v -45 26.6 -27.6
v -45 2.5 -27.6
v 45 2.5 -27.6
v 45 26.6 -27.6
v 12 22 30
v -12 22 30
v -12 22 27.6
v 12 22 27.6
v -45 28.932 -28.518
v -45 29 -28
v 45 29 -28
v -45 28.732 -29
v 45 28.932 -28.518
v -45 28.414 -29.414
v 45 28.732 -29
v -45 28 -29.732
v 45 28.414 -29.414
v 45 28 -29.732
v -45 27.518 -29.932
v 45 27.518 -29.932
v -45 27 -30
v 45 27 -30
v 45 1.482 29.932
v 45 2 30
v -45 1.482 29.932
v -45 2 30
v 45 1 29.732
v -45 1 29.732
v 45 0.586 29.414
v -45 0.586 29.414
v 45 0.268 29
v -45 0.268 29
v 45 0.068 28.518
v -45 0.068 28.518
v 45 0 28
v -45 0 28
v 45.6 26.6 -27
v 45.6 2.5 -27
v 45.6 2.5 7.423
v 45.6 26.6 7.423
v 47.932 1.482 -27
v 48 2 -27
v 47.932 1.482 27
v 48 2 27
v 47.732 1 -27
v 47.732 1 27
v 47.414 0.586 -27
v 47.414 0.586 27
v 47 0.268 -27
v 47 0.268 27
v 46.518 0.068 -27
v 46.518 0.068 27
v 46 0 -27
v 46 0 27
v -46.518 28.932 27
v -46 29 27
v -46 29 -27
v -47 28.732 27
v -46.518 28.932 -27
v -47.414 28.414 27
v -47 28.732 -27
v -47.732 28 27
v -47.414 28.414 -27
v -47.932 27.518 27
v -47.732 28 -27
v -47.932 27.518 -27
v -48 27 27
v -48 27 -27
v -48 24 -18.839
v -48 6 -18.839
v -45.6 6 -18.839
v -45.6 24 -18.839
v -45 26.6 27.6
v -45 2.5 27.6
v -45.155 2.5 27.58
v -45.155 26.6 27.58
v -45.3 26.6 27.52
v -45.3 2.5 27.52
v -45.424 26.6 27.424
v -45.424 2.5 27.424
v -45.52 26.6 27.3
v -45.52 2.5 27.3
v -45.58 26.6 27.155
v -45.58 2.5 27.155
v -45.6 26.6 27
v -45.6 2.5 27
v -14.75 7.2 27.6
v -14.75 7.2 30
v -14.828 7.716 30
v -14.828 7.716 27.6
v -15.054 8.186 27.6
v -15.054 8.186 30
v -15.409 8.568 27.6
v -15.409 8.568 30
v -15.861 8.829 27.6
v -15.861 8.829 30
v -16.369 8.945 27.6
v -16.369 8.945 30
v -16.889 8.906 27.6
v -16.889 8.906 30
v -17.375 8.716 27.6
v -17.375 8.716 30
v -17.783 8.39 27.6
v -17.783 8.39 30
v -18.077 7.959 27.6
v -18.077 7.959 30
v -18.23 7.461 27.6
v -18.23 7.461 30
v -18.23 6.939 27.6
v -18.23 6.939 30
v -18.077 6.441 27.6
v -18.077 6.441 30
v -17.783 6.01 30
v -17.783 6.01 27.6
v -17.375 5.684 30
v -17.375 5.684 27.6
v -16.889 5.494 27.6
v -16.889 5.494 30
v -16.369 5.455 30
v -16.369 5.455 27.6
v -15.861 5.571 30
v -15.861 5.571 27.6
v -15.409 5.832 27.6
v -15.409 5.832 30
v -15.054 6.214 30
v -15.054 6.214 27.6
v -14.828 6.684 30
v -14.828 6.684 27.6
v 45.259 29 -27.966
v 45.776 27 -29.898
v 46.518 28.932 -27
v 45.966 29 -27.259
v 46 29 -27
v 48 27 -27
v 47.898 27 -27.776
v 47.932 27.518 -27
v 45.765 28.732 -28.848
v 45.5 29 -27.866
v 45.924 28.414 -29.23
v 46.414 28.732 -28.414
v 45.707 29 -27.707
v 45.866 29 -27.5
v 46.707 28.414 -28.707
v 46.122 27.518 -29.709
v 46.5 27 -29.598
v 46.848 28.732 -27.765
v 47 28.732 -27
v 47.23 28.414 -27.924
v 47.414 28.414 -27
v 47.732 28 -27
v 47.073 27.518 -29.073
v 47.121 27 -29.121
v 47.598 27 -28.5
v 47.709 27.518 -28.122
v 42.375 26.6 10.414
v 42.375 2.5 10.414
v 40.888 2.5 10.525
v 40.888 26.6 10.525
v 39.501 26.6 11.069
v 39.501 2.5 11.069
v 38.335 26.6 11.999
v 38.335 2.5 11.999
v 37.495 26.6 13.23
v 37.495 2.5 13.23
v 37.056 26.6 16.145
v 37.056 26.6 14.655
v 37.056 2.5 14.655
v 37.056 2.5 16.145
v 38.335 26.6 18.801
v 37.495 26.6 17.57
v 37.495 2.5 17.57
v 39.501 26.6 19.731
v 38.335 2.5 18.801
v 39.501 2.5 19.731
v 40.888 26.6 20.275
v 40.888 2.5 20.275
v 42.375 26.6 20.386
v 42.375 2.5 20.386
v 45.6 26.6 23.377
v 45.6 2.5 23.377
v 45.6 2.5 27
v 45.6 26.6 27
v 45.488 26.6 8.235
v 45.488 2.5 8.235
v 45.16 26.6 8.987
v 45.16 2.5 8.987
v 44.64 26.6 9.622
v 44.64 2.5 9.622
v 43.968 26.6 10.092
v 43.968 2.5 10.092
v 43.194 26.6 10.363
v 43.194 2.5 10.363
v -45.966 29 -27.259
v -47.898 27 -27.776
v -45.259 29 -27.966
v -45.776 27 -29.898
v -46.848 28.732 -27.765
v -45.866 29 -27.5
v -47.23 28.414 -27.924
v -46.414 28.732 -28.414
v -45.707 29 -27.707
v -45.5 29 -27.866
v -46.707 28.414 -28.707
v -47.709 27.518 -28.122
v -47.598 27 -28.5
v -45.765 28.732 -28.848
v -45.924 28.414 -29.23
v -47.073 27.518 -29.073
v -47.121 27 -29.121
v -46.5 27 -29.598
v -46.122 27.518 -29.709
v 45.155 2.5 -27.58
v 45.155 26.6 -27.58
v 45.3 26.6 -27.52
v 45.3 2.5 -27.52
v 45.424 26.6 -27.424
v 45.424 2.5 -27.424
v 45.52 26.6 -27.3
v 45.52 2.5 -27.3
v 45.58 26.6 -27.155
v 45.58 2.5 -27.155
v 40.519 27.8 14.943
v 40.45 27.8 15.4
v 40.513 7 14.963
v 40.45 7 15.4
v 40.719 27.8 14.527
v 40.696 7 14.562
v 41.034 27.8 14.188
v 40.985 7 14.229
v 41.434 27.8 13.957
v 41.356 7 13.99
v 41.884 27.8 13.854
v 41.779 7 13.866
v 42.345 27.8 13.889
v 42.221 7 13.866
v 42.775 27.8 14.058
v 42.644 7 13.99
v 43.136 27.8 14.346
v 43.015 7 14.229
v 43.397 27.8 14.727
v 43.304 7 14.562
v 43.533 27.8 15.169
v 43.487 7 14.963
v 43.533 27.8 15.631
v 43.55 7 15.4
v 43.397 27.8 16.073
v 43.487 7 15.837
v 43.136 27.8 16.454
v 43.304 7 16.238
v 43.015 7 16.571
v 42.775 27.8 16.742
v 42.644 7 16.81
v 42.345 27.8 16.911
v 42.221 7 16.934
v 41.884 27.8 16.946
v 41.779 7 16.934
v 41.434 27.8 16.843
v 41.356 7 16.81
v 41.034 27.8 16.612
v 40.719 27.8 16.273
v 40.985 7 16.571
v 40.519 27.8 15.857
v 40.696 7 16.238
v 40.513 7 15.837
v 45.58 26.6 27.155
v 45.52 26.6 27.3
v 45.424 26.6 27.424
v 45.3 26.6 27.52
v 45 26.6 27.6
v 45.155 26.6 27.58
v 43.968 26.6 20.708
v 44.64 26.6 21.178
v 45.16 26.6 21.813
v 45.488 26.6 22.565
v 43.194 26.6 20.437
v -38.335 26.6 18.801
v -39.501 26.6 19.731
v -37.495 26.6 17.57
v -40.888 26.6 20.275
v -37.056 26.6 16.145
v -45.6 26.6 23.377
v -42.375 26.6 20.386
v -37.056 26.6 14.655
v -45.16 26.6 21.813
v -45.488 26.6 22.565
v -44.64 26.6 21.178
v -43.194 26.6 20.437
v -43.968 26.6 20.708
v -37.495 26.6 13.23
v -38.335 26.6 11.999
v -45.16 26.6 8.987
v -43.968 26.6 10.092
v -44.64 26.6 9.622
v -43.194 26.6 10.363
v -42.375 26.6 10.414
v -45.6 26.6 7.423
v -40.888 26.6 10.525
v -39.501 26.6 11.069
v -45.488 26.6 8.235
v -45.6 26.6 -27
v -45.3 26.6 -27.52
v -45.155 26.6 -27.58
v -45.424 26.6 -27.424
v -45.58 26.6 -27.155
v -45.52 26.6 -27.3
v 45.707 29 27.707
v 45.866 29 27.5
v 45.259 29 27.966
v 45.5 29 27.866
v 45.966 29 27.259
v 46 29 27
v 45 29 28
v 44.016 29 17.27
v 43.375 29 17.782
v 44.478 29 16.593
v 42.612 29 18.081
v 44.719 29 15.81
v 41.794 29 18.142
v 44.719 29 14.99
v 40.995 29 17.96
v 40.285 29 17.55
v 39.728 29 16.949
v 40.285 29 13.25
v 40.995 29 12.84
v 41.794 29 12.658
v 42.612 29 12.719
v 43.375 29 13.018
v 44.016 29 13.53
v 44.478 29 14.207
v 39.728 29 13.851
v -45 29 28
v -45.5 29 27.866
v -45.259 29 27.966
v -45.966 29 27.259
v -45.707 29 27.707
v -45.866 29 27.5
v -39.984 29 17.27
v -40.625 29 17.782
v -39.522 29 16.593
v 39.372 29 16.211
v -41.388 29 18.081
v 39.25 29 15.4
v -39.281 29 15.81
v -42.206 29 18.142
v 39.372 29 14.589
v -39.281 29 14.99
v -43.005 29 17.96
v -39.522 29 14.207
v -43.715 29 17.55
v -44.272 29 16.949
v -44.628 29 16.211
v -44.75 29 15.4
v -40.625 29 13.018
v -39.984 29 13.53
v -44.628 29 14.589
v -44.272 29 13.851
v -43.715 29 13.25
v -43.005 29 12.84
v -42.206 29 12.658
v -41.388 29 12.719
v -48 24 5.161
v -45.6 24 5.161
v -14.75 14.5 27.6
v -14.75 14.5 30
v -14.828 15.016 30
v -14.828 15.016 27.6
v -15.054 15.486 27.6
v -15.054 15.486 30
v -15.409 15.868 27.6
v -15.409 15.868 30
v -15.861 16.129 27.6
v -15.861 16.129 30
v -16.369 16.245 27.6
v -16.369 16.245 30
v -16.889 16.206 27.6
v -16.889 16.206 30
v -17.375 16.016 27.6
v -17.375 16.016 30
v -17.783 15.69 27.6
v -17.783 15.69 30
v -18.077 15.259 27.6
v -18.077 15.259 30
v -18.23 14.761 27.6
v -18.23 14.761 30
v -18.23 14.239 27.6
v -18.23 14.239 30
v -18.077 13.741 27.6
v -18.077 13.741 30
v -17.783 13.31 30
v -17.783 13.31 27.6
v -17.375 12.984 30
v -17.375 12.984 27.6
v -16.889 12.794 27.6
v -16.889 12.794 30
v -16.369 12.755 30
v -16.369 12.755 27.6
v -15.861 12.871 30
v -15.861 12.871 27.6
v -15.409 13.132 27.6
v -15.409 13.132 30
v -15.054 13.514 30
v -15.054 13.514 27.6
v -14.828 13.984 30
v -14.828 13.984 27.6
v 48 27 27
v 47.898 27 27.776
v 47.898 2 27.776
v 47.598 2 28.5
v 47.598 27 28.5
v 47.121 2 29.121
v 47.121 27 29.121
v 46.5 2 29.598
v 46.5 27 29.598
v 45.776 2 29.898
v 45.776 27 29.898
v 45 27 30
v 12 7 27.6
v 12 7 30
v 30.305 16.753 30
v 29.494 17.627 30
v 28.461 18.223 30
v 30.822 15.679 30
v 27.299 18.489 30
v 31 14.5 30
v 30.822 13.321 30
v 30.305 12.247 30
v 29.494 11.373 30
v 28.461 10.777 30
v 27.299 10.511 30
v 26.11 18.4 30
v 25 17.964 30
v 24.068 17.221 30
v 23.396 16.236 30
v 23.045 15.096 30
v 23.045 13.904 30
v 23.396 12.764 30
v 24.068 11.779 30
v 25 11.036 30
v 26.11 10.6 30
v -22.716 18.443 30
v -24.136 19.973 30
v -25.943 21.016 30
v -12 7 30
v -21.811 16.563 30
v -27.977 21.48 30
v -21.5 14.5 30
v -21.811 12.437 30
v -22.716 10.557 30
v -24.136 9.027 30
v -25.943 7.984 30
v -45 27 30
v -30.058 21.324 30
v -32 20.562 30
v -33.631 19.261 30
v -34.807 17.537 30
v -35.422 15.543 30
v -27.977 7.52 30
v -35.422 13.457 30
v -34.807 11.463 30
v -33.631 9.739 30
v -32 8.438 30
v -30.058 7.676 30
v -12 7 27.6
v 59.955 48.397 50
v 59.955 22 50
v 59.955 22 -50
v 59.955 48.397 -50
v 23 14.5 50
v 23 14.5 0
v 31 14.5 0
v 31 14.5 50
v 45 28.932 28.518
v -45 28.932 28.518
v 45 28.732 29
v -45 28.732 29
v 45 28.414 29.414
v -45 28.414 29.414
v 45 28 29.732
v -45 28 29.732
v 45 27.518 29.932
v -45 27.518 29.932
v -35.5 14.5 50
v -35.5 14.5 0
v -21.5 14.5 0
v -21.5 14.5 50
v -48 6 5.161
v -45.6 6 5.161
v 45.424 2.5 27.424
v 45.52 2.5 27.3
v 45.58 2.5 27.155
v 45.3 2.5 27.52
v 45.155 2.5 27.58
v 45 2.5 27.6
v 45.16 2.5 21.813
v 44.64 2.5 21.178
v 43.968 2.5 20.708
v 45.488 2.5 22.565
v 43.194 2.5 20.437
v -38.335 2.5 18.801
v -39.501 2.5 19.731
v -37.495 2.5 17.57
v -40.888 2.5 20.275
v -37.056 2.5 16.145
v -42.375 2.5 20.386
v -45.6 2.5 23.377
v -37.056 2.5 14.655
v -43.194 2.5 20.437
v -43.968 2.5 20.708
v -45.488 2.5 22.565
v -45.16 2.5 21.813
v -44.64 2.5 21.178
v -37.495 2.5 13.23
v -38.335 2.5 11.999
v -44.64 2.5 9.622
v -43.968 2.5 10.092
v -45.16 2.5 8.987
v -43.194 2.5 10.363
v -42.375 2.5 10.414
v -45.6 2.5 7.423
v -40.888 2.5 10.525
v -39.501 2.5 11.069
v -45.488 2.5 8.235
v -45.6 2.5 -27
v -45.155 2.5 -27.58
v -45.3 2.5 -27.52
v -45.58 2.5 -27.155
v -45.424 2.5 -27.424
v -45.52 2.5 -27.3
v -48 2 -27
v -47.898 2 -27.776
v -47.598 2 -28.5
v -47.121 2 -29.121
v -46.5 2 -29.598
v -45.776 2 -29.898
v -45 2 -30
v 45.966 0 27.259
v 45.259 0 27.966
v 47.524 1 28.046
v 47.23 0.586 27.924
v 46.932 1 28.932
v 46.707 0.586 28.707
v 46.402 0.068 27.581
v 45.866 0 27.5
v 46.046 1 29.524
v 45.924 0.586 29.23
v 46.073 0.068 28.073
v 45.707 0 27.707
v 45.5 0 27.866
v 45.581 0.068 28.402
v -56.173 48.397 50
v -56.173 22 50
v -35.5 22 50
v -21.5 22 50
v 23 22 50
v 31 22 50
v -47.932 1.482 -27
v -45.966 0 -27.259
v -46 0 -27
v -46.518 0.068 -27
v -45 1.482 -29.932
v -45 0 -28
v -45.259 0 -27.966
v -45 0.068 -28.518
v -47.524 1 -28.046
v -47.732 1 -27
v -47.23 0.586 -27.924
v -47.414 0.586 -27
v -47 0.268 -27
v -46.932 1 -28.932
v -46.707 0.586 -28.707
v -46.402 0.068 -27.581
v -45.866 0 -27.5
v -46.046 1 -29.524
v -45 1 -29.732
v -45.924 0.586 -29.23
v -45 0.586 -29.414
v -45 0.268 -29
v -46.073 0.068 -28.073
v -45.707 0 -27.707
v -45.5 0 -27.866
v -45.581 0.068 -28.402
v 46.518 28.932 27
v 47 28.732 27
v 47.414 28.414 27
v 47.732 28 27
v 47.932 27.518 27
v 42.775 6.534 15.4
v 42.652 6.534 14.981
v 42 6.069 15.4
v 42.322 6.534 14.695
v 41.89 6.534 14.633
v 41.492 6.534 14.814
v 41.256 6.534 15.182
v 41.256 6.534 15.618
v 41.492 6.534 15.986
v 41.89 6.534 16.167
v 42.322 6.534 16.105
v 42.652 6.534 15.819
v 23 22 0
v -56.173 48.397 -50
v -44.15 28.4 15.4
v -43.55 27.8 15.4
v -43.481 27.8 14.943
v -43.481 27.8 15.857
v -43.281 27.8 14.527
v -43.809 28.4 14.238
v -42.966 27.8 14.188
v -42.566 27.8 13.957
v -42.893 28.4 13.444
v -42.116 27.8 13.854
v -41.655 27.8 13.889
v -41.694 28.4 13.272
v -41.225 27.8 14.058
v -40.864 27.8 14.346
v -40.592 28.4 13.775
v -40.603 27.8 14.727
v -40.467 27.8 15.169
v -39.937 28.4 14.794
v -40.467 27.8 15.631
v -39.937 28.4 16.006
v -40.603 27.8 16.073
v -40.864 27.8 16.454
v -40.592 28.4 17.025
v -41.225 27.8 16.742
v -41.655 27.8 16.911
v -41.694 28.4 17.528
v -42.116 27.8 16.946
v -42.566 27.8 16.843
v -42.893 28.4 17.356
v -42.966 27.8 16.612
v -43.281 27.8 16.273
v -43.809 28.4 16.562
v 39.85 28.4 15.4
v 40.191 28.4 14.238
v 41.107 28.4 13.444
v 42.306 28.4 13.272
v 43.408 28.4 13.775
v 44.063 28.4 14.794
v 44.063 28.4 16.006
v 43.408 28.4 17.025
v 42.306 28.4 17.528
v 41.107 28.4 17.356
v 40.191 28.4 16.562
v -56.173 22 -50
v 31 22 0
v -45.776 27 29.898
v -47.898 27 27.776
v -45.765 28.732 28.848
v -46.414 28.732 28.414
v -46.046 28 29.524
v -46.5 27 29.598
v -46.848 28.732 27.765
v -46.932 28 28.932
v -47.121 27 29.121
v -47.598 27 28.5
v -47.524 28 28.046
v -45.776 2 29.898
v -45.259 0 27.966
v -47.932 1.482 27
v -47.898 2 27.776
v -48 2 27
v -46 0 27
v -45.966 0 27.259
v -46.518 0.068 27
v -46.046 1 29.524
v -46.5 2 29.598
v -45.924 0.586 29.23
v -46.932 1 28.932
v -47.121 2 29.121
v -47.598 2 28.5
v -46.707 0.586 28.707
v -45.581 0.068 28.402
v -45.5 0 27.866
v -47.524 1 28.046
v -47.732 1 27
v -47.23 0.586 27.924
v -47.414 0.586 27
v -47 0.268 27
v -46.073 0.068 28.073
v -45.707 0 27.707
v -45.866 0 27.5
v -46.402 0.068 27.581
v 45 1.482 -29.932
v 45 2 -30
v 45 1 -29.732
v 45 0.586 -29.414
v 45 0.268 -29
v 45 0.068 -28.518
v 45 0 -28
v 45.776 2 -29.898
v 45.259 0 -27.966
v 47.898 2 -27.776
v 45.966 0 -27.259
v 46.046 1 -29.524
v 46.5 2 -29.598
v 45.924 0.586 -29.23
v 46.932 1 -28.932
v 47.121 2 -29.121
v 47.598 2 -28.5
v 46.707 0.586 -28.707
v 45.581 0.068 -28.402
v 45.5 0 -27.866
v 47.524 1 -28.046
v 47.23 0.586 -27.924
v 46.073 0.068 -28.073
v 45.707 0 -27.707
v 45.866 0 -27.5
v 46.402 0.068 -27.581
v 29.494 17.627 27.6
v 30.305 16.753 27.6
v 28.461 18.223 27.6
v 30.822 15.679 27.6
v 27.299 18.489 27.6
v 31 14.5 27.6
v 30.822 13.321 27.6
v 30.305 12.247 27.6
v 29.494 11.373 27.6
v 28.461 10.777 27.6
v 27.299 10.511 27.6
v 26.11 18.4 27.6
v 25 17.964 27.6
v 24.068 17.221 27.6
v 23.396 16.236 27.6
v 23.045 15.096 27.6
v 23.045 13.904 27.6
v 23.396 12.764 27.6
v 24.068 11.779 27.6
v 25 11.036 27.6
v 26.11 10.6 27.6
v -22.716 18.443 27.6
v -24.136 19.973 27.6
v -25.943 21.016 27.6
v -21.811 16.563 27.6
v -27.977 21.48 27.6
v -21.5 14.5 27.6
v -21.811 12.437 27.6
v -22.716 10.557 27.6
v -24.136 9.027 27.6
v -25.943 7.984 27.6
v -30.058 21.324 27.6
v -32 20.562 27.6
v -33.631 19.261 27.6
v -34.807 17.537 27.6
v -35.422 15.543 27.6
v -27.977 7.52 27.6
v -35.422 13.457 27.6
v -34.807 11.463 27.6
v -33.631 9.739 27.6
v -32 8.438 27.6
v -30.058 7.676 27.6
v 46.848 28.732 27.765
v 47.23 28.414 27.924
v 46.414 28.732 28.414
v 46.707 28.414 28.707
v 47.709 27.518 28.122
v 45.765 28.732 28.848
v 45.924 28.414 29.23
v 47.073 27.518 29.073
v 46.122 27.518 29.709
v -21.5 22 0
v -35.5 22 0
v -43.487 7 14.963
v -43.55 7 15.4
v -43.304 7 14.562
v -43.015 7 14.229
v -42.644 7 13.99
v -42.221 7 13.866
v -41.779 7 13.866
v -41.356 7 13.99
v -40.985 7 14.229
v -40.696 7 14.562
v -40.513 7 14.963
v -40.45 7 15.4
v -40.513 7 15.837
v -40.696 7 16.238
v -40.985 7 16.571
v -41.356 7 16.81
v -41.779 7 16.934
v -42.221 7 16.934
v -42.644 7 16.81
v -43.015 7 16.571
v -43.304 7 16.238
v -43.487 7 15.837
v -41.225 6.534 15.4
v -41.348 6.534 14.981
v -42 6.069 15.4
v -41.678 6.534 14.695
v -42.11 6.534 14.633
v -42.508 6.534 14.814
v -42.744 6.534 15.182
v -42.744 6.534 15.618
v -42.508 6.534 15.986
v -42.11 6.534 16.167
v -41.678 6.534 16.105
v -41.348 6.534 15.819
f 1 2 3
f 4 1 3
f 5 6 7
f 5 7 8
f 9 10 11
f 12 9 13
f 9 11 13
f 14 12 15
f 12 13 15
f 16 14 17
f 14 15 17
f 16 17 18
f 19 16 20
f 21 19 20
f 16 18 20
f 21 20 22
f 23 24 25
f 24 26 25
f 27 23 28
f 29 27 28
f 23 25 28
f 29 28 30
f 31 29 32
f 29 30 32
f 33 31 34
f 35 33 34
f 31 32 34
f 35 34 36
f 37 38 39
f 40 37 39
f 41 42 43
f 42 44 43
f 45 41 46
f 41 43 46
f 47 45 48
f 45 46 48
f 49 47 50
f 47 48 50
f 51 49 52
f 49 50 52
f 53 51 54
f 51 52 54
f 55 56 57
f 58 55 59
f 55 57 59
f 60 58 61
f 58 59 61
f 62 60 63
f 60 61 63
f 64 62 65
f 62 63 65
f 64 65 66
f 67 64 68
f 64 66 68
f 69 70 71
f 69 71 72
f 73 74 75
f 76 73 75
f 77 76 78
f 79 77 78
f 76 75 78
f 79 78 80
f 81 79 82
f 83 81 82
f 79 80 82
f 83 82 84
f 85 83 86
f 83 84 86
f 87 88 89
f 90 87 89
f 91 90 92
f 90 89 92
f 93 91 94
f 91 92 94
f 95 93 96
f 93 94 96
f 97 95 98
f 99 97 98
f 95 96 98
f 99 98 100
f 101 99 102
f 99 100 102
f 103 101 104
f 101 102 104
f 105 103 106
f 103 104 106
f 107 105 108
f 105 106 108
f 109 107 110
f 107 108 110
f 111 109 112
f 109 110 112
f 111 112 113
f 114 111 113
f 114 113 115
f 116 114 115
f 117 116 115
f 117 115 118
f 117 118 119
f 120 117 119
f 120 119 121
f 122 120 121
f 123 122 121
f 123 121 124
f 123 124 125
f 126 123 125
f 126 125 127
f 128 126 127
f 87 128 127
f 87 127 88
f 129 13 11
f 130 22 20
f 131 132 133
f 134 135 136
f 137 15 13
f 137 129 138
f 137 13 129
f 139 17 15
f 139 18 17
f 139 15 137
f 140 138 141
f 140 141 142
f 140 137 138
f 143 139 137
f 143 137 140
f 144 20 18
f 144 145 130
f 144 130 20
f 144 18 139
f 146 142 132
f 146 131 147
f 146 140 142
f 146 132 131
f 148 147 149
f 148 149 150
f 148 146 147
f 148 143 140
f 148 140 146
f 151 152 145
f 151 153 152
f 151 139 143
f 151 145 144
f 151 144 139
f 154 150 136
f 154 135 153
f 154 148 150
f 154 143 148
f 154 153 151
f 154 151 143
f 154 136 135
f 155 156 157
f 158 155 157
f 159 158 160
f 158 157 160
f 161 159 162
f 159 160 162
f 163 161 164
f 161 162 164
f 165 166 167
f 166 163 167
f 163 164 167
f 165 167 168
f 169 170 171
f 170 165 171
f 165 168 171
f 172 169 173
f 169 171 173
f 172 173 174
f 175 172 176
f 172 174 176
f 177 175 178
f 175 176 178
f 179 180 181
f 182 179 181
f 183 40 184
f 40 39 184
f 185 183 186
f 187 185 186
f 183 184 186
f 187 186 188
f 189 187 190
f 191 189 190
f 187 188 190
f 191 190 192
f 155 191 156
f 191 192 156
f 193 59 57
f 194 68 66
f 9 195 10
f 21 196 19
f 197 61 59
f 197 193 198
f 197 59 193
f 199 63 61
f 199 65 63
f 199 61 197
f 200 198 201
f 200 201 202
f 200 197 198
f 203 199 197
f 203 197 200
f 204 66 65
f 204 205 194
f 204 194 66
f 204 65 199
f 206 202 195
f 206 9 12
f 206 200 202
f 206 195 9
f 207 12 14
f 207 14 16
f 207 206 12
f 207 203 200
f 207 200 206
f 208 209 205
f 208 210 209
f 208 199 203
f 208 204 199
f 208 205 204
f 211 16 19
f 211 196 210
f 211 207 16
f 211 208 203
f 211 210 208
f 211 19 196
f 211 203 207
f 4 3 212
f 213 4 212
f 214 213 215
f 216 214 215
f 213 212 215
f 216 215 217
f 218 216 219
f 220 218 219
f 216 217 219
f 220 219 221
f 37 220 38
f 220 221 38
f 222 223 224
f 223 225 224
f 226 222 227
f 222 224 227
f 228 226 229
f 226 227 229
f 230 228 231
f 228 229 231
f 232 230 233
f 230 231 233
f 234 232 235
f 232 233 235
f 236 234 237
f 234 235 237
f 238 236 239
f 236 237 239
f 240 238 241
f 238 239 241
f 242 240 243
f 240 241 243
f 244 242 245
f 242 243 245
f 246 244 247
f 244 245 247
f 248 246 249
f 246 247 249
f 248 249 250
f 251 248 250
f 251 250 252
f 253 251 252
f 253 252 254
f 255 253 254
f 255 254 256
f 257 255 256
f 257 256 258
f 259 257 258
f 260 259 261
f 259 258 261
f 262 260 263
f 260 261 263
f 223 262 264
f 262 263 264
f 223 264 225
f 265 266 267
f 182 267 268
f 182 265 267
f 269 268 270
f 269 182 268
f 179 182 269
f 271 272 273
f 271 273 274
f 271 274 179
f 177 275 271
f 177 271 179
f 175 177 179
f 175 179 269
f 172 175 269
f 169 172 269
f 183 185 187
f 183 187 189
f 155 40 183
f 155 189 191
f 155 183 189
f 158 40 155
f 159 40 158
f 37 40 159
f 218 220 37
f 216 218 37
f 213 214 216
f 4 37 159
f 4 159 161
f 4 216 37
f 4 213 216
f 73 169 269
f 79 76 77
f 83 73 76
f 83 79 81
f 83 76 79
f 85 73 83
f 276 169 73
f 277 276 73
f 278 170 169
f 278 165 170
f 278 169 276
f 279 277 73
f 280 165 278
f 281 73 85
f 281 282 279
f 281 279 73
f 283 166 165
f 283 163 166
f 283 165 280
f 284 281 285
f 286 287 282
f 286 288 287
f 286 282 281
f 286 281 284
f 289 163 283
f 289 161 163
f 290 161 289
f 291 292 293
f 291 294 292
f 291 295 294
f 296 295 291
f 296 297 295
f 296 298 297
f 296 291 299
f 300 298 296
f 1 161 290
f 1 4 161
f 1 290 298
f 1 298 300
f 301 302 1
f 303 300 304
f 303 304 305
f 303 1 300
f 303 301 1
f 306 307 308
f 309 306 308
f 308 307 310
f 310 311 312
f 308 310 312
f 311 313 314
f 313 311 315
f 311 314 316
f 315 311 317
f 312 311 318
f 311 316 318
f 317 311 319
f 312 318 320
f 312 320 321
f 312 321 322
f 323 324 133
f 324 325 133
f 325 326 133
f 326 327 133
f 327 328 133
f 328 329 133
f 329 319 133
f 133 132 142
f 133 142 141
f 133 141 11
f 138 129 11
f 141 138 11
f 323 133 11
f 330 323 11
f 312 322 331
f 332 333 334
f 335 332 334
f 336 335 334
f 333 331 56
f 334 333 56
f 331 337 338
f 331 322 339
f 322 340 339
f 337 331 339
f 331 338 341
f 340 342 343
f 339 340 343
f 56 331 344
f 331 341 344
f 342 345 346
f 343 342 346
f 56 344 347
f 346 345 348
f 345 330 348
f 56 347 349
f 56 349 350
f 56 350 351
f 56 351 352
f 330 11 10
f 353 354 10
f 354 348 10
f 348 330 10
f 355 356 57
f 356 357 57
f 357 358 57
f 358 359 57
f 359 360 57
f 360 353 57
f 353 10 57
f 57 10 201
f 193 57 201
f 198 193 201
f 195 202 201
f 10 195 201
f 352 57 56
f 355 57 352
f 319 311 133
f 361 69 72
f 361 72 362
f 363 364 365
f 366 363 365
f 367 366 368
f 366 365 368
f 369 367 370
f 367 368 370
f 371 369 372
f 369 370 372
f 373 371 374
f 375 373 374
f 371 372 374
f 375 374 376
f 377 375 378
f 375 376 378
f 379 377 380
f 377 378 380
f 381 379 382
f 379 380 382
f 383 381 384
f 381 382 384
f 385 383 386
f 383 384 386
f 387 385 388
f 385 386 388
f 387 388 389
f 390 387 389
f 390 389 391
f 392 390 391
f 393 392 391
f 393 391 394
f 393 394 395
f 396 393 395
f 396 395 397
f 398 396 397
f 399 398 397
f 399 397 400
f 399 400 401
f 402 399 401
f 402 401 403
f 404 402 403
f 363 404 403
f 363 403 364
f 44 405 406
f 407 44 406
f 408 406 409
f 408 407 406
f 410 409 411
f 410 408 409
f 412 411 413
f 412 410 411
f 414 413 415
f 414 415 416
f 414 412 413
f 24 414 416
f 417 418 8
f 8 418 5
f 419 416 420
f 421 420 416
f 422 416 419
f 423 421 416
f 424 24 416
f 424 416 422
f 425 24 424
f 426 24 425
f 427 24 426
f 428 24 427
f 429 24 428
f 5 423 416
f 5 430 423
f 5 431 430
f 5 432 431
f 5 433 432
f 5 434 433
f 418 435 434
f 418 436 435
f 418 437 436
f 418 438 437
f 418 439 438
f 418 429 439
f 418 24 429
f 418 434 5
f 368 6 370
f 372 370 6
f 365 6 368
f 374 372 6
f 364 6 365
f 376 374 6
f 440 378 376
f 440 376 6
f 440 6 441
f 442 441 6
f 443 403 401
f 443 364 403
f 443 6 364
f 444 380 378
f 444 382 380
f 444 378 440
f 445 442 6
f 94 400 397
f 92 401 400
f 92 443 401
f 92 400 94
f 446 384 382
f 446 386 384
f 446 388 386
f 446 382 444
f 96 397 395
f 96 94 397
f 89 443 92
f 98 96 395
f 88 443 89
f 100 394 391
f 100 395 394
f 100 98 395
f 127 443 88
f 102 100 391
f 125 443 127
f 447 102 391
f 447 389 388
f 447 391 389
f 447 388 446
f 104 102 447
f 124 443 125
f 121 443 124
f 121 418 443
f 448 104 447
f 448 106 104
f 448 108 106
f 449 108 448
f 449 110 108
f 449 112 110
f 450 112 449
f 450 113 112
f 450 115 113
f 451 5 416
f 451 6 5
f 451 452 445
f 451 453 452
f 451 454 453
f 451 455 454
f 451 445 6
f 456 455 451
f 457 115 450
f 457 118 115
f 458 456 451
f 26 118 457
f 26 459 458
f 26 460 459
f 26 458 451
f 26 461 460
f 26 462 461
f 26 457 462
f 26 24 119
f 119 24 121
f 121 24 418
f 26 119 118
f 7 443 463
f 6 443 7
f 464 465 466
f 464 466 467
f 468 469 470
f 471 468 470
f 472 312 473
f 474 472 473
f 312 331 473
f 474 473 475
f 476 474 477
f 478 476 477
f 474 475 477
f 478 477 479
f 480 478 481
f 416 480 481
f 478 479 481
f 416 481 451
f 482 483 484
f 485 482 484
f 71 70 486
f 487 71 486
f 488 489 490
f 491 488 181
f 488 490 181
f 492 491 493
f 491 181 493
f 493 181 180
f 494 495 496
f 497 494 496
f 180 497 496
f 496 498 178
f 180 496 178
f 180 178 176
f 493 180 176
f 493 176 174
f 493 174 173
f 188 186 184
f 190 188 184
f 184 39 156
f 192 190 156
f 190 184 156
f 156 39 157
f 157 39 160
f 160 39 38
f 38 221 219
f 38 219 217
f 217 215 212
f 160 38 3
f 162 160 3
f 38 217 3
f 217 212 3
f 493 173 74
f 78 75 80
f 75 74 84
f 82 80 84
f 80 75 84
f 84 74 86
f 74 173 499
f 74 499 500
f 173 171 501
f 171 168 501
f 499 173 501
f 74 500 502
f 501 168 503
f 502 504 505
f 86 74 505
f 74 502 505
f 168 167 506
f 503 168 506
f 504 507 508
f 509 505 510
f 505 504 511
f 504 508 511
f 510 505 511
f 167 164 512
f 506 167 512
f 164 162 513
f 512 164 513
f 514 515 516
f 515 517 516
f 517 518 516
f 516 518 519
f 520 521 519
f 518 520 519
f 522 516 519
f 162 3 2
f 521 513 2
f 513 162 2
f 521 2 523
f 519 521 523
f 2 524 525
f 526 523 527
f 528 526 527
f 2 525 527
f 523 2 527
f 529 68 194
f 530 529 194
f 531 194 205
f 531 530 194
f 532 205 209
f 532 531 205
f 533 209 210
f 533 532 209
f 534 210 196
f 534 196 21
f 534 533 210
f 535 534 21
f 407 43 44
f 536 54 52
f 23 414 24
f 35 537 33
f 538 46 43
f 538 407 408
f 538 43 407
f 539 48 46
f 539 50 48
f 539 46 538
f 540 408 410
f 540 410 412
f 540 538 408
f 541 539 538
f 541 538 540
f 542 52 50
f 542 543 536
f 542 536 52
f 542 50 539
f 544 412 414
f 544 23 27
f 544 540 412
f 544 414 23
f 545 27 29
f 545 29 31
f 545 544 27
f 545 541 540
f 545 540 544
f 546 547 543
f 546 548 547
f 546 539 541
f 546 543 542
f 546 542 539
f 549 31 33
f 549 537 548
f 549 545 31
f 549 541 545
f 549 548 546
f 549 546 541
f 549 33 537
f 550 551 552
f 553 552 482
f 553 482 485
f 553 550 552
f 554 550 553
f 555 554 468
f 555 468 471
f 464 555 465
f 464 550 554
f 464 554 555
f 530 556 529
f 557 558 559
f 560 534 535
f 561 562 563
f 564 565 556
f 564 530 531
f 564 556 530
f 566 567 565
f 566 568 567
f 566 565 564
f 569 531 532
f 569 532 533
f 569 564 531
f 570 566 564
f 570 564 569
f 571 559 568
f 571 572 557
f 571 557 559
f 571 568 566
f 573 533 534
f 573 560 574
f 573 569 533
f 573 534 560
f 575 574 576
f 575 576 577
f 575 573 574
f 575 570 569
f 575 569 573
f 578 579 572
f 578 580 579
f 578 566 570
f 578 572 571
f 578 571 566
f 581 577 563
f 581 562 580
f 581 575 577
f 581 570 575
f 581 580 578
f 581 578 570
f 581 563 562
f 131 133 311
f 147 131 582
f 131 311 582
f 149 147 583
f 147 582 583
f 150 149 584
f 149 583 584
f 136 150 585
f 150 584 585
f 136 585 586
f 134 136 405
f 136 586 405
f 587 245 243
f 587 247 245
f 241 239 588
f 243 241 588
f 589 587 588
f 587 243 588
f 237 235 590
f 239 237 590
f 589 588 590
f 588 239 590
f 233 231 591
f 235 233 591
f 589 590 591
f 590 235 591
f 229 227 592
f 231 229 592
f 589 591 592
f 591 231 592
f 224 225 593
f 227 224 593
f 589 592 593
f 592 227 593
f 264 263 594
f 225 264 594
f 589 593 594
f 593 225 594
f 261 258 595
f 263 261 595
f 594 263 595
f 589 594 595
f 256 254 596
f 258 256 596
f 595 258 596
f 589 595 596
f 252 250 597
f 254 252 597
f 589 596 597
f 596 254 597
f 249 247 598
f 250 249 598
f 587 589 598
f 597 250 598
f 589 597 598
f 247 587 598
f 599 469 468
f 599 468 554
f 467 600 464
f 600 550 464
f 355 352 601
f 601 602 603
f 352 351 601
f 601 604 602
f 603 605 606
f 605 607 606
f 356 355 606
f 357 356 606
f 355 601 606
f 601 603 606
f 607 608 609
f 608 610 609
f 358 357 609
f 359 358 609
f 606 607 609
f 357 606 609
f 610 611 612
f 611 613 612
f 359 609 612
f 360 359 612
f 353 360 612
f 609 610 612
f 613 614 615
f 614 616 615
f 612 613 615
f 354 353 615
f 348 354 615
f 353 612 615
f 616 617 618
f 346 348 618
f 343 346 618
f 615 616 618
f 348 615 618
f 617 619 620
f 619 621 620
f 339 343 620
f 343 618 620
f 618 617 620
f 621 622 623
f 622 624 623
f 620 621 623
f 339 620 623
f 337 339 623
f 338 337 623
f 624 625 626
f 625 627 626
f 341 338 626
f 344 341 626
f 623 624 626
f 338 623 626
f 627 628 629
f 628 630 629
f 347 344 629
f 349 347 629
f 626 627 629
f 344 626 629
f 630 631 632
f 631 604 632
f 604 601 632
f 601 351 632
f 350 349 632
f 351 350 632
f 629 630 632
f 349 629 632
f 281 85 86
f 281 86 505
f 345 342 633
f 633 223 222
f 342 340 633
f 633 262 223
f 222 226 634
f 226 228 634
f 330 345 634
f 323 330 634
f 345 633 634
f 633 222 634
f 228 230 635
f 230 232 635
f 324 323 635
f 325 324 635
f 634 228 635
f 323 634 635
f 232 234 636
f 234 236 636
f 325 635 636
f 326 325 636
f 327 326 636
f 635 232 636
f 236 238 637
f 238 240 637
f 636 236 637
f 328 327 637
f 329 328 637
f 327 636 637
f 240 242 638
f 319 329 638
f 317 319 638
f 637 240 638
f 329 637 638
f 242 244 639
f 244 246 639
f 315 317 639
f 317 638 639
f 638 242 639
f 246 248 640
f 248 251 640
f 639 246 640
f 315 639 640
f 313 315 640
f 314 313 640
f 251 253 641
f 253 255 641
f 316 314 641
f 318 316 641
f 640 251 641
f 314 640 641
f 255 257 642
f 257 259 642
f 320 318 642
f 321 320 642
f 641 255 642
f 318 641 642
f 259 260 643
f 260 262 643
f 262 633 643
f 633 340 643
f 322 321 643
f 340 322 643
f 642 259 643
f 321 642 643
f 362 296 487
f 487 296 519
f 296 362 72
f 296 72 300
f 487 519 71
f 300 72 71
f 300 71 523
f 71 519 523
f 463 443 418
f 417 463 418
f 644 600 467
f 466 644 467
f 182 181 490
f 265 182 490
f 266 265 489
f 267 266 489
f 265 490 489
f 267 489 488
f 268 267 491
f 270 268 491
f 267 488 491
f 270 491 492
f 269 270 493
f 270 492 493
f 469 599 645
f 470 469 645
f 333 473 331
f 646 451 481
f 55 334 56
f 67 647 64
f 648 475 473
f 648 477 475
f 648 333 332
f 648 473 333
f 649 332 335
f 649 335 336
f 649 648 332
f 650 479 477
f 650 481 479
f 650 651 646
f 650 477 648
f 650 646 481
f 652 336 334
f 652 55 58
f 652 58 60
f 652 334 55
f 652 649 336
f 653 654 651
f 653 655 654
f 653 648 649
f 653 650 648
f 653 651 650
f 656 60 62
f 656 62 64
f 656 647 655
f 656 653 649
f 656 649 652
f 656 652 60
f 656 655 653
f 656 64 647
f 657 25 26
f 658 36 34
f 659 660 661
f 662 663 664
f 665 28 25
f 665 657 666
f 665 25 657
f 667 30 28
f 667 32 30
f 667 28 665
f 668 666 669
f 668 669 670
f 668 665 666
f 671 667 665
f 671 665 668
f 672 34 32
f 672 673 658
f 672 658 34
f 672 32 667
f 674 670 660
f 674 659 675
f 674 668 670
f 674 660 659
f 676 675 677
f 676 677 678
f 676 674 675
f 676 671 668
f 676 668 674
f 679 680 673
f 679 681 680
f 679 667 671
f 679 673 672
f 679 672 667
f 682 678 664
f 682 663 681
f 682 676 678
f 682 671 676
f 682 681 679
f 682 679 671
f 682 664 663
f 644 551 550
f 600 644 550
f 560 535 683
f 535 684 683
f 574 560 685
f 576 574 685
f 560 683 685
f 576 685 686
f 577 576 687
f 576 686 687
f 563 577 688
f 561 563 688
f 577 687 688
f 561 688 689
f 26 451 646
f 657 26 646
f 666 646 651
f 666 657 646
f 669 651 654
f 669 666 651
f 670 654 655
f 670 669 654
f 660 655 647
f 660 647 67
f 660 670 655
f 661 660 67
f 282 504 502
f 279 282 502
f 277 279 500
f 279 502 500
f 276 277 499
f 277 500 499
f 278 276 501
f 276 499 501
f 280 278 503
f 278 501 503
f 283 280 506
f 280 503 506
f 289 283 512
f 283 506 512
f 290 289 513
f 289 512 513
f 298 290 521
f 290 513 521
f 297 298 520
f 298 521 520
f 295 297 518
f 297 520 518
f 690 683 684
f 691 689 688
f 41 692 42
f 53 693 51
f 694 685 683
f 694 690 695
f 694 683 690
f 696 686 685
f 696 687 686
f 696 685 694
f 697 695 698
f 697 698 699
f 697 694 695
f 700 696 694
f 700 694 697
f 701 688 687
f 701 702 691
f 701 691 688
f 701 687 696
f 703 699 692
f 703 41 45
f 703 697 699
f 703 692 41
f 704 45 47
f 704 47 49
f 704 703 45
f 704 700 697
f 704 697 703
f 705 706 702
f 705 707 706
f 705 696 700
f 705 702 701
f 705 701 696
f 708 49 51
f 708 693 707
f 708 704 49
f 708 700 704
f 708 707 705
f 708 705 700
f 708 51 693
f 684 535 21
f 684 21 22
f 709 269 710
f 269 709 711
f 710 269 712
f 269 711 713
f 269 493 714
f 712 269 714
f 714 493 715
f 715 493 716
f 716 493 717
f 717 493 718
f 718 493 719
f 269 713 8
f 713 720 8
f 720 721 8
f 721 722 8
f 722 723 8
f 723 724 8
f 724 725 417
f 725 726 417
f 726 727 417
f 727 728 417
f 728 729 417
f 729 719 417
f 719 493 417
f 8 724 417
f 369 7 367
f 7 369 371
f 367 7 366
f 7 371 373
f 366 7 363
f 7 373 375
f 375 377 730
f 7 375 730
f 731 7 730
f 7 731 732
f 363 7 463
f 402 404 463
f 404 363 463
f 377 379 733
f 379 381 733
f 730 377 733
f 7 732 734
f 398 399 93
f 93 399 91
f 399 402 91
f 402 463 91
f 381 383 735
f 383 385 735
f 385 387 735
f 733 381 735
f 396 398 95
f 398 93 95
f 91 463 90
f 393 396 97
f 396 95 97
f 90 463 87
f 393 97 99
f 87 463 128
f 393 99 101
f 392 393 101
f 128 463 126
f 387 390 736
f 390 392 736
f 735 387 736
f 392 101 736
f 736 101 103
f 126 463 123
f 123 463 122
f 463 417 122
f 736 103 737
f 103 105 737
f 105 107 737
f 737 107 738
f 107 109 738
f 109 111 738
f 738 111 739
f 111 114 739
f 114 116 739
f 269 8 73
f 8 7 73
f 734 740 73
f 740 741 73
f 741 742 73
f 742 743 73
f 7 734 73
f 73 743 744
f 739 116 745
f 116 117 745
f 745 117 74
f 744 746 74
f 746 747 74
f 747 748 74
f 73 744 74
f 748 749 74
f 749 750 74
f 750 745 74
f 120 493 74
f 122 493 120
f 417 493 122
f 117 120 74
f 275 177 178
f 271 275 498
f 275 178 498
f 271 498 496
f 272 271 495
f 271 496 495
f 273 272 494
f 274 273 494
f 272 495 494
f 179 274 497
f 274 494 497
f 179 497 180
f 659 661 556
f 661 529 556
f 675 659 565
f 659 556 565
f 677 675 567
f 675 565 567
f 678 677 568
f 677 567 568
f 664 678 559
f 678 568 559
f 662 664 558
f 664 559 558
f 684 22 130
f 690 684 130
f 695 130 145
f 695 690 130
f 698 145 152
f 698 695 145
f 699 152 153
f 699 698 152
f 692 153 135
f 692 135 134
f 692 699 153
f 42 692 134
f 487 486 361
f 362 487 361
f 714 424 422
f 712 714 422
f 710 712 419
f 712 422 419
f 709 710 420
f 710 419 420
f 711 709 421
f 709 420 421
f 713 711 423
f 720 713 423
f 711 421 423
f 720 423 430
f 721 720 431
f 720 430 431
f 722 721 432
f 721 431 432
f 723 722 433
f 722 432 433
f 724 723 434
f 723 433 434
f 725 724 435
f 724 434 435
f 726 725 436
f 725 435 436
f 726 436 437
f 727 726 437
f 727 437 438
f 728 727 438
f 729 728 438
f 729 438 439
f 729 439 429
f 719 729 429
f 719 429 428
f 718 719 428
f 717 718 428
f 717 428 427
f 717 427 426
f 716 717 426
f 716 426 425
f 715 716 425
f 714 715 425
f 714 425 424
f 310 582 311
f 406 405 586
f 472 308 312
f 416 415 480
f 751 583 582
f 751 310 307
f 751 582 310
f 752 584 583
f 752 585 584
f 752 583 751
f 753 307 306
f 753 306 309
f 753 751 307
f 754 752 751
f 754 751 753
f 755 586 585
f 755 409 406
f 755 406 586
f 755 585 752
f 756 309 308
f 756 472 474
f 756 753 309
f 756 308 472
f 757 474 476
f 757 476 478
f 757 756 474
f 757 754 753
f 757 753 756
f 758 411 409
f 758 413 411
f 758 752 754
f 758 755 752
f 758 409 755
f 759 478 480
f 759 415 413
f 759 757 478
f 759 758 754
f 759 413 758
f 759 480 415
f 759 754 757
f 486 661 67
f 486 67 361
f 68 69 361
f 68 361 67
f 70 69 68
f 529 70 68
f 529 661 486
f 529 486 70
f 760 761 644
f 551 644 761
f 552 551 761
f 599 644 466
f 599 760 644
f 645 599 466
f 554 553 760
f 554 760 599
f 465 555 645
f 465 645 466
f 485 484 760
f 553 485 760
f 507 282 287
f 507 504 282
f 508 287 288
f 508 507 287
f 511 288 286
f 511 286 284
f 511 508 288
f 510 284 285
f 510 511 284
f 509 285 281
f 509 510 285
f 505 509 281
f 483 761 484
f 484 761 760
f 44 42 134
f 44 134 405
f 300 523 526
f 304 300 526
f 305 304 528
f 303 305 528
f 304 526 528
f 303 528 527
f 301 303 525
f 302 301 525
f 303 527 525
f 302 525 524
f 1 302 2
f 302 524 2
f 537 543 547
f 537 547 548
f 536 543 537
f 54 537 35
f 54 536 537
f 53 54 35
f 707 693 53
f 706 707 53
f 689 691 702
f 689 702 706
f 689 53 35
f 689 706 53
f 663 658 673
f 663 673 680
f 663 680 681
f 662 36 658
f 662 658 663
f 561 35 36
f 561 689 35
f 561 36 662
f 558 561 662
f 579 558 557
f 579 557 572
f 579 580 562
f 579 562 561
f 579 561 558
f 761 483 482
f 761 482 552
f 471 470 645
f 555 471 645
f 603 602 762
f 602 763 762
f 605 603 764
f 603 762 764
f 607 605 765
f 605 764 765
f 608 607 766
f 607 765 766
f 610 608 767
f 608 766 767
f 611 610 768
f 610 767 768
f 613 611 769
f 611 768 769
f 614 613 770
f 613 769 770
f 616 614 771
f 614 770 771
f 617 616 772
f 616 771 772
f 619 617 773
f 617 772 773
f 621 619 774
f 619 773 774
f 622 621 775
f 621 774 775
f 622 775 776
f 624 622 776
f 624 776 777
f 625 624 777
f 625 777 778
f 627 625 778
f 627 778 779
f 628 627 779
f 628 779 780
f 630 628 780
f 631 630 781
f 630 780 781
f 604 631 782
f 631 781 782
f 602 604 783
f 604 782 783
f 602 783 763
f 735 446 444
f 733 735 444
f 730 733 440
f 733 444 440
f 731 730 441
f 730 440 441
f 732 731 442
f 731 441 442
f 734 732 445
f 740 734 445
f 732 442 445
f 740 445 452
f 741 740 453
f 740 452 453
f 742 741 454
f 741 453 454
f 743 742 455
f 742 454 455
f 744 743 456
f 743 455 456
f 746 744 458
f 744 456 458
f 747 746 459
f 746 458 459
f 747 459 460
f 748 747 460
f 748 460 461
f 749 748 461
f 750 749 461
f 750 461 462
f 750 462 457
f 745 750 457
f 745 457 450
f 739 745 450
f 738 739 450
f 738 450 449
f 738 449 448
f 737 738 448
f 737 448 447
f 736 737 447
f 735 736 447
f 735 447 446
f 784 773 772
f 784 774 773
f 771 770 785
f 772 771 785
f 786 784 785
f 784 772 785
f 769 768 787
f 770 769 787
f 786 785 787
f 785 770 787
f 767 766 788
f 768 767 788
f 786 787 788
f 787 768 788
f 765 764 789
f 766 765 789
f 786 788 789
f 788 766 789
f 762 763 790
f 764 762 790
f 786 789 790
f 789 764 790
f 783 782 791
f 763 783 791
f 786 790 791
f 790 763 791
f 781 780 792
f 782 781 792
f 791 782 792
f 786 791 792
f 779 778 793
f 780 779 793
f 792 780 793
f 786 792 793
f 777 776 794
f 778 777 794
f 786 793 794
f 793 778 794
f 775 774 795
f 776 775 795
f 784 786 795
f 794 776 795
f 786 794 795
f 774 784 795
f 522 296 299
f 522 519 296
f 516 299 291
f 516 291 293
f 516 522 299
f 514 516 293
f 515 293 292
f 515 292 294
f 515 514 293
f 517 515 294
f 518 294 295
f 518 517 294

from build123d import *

# Parameters (mm, degrees)
BOTTOM_DEPTH                                         = 2.5
WALLS_DEPTH                                          = 29
SKETCH3_R                                            = 5
BOLTS_DEPTH                                          = 29
TOPCOVER_START                                       = 26.6
TOPCOVER_DEPTH                                       = 2.4
CSK_FOR_M2_5_COUNTERSUNK_FLAT_HEAD_SCREW_D           = 3.1
CSK_FOR_M2_5_COUNTERSUNK_FLAT_HEAD_SCREW_DEPTH       = 22
CSK_FOR_M2_5_COUNTERSUNK_FLAT_HEAD_SCREW_CSINK_D     = 5.5
CSK_FOR_M2_5_COUNTERSUNK_FLAT_HEAD_SCREW_CSINK_ANGLE = 90
CSK_FOR_M2_5_COUNTERSUNK_FLAT_HEAD_SCREW_TIP         = 0.931333959
AC_IN_REACH                                          = 106.676
SKETCH6_W                                            = 24
SKETCH6_H                                            = 18
CONTROL_REACH                                        = 84.128
SKETCH7_R                                            = 7
SKETCH7_R_2                                          = 4
SKETCH7_R_3                                          = 1.75
SKETCH7_W                                            = 24
SKETCH7_H                                            = 15
FILLET1_R                                            = 2
SKETCH8_W                                            = 116.128476494
SKETCH8_H                                            = 26.397161715
CUT1_DEPTH                                           = 50
SKETCH9_W                                            = 14
SKETCH9_H                                            = 29.14122115
CUT2_DEPTH                                           = 50
SKETCH10_W                                           = 8
SKETCH10_H                                           = 22.262234641
CUT3_DEPTH                                           = 50
FILLET2_R                                            = 3


with BuildPart() as part:
    # Sketch1 → Bottom (new body)
    with BuildSketch(Plane(origin=(0, 0, 0), x_dir=(1, 0, 0), z_dir=(0, 1, 0))):
        with BuildLine():
            Line((-45, 30), (45, 30))
            ThreePointArc((45, 30), (47.121320344, 29.121320344), (48, 27))
            Line((48, 27), (48, -27))
            ThreePointArc((48, -27), (47.121320344, -29.121320344), (45, -30))
            Line((45, -30), (-45, -30))
            ThreePointArc((-45, -30), (-47.121320344, -29.121320344), (-48, -27))
            Line((-48, -27), (-48, 27))
            ThreePointArc((-48, 27), (-47.121320344, 29.121320344), (-45, 30))
        make_face()
    extrude(amount=BOTTOM_DEPTH)

    # Sketch1<2> → Walls (add)
    with BuildSketch(Plane(origin=(0, 0, 0), x_dir=(1, 0, 0), z_dir=(0, 1, 0))):
        with BuildLine():
            Line((-45, 30), (45, 30))
            ThreePointArc((45, 30), (47.121320344, 29.121320344), (48, 27))
            Line((48, 27), (48, -27))
            ThreePointArc((48, -27), (47.121320344, -29.121320344), (45, -30))
            Line((45, -30), (-45, -30))
            ThreePointArc((-45, -30), (-47.121320344, -29.121320344), (-48, -27))
            Line((-48, -27), (-48, 27))
            ThreePointArc((-48, 27), (-47.121320344, 29.121320344), (-45, 30))
        make_face()
        with BuildLine():
            Line((-45, 27.6), (45, 27.6))
            ThreePointArc((45, 27.6), (45.424264069, 27.424264069), (45.6, 27))
            Line((45.6, 27), (45.6, -27))
            ThreePointArc((45.6, -27), (45.424264069, -27.424264069), (45, -27.6))
            Line((45, -27.6), (-45, -27.6))
            ThreePointArc((-45, -27.6), (-45.424264069, -27.424264069), (-45.6, -27))
            Line((-45.6, -27), (-45.6, 27))
            ThreePointArc((-45.6, 27), (-45.424264069, 27.424264069), (-45, 27.6))
        make_face(mode=Mode.SUBTRACT)
    extrude(amount=WALLS_DEPTH)

    # Sketch3 → Bolts (add)
    with BuildSketch(Plane(origin=(0, 0, 0), x_dir=(1, 0, 0), z_dir=(0, 1, 0))):
        with Locations((-42, -15.4)):
            Circle(SKETCH3_R)
        with Locations((42, -15.4)):
            Circle(SKETCH3_R)
    extrude(amount=BOLTS_DEPTH)

    # Sketch1<3> → TopCover (add)
    with BuildSketch(Plane(origin=(0, 0, 0), x_dir=(1, 0, 0), z_dir=(0, 1, 0)).offset(TOPCOVER_START)):
        with BuildLine():
            Line((-45, 30), (45, 30))
            ThreePointArc((45, 30), (47.121320344, 29.121320344), (48, 27))
            Line((48, 27), (48, -27))
            ThreePointArc((48, -27), (47.121320344, -29.121320344), (45, -30))
            Line((45, -30), (-45, -30))
            ThreePointArc((-45, -30), (-47.121320344, -29.121320344), (-48, -27))
            Line((-48, -27), (-48, 27))
            ThreePointArc((-48, 27), (-47.121320344, 29.121320344), (-45, 30))
        make_face()
    extrude(amount=TOPCOVER_DEPTH)

    # CSK for M2.5 Countersunk Flat Head Screw1
    with Locations(Plane(origin=(0, 29, 0), x_dir=(1, 0, 0), z_dir=(0, 1, 0))):
        with Locations((-42, -15.4), (42, -15.4)):
            CounterSinkHole(CSK_FOR_M2_5_COUNTERSUNK_FLAT_HEAD_SCREW_D / 2, CSK_FOR_M2_5_COUNTERSUNK_FLAT_HEAD_SCREW_CSINK_D / 2, depth=CSK_FOR_M2_5_COUNTERSUNK_FLAT_HEAD_SCREW_DEPTH, counter_sink_angle=CSK_FOR_M2_5_COUNTERSUNK_FLAT_HEAD_SCREW_CSINK_ANGLE)
            with Locations((0, 0, -(CSK_FOR_M2_5_COUNTERSUNK_FLAT_HEAD_SCREW_DEPTH + CSK_FOR_M2_5_COUNTERSUNK_FLAT_HEAD_SCREW_TIP / 2))):  # 118° drill point
                Cone(0, CSK_FOR_M2_5_COUNTERSUNK_FLAT_HEAD_SCREW_D / 2, CSK_FOR_M2_5_COUNTERSUNK_FLAT_HEAD_SCREW_TIP, mode=Mode.SUBTRACT)

    # Sketch6 → AC_In (cut, up to next)
    with BuildSketch(Plane.ZY.offset(48), mode=Mode.PRIVATE) as ac_in_sk1:
        with Locations((-6.838985664, 15)):
            Rectangle(SKETCH6_W, SKETCH6_H)
    ac_in_tool1 = extrude(ac_in_sk1.sketch, amount=-AC_IN_REACH, mode=Mode.PRIVATE) & part.part
    add(ac_in_tool1.solids().sort_by_distance((-48, 15, -6.838986))[0], mode=Mode.SUBTRACT)

    # Sketch7 → Control (cut, up to next)
    with BuildSketch(Plane.XY.offset(30), mode=Mode.PRIVATE) as control_sk1:
        with Locations((-28.5, 14.5)):
            Circle(SKETCH7_R)
    control_tool1 = extrude(control_sk1.sketch, amount=-CONTROL_REACH, mode=Mode.PRIVATE) & part.part
    # Sketch7 → Control (cut, up to next)
    with BuildSketch(Plane.XY.offset(30), mode=Mode.PRIVATE) as control_sk2:
        with Locations((27, 14.5)):
            Circle(SKETCH7_R_2)
    control_tool2 = extrude(control_sk2.sketch, amount=-CONTROL_REACH, mode=Mode.PRIVATE) & part.part
    # Sketch7 → Control (cut, up to next)
    with BuildSketch(Plane.XY.offset(30), mode=Mode.PRIVATE) as control_sk3:
        with Locations((-16.5, 14.5)):
            Circle(SKETCH7_R_3)
    control_tool3 = extrude(control_sk3.sketch, amount=-CONTROL_REACH, mode=Mode.PRIVATE) & part.part
    # Sketch7 → Control (cut, up to next)
    with BuildSketch(Plane.XY.offset(30), mode=Mode.PRIVATE) as control_sk4:
        with Locations((-16.5, 7.2)):
            Circle(SKETCH7_R_3)
    control_tool4 = extrude(control_sk4.sketch, amount=-CONTROL_REACH, mode=Mode.PRIVATE) & part.part
    # Sketch7 → Control (cut, up to next)
    with BuildSketch(Plane.XY.offset(30), mode=Mode.PRIVATE) as control_sk5:
        with Locations((0, 14.5)):
            Rectangle(SKETCH7_W, SKETCH7_H)
    control_tool5 = extrude(control_sk5.sketch, amount=-CONTROL_REACH, mode=Mode.PRIVATE) & part.part
    add(control_tool1.solids().sort_by_distance((-28.5, 14.5, 30))[0], mode=Mode.SUBTRACT)
    add(control_tool2.solids().sort_by_distance((27, 14.5, 30))[0], mode=Mode.SUBTRACT)
    add(control_tool3.solids().sort_by_distance((-16.5, 14.5, 30))[0], mode=Mode.SUBTRACT)
    add(control_tool4.solids().sort_by_distance((-16.5, 7.2, 30))[0], mode=Mode.SUBTRACT)
    add(control_tool5.solids().sort_by_distance((0, 14.5, 30))[0], mode=Mode.SUBTRACT)

    # Fillet1
    fillet1_edges = [part.edges().sort_by_distance(p)[0] for p in [
        (0, 0, 30),
        (-47.121320344, 0, 29.121320344),
        (-47.121320344, 29, 29.121320344),
        (0, 29, 30),
        (47.121320344, 29, 29.121320344),
        (48, 29, 0),
        (47.121320344, 29, -29.121320344),
        (0, 29, -30),
        (-47.121320344, 29, -29.121320344),
        (-48, 29, 0),
        (-48, 0, 0),
        (-47.121320344, 0, -29.121320344),
        (0, 0, -30),
        (47.121320344, 0, -29.121320344),
        (48, 0, 0),
        (47.121320344, 0, 29.121320344),
    ]]
    fillet(fillet1_edges, radius=FILLET1_R)

    # Fillet2
    fillet2_edges = [part.edges().sort_by_distance(p)[0] for p in [
        (45.6, 14.55, 18.869870315),
        (-45.6, 14.55, 11.930129685),
        (-45.6, 14.55, 18.869870315),
        (45.6, 14.55, 11.930129685),
    ]]
    fillet(fillet2_edges, radius=FILLET2_R)


with BuildPart() as body_2:
    # Sketch8 → Cut1 (new, symmetric)
    with BuildSketch(Plane.XY):
        with Locations((1.891186967, 35.198580858)):
            Rectangle(SKETCH8_W, SKETCH8_H)
    extrude(amount=CUT1_DEPTH, both=True)

    # Sketch9 → Cut2 (add)
    with BuildSketch(Plane.XY):
        with Locations((-28.5, 29.070610575)):
            Rectangle(SKETCH9_W, SKETCH9_H)
    extrude(amount=CUT2_DEPTH)

    # Sketch10 → Cut3 (add)
    with BuildSketch(Plane.XY):
        with Locations((27, 25.63111732)):
            Rectangle(SKETCH10_W, SKETCH10_H)
    extrude(amount=CUT3_DEPTH)


solid = Compound([part.part, body_2.part])
